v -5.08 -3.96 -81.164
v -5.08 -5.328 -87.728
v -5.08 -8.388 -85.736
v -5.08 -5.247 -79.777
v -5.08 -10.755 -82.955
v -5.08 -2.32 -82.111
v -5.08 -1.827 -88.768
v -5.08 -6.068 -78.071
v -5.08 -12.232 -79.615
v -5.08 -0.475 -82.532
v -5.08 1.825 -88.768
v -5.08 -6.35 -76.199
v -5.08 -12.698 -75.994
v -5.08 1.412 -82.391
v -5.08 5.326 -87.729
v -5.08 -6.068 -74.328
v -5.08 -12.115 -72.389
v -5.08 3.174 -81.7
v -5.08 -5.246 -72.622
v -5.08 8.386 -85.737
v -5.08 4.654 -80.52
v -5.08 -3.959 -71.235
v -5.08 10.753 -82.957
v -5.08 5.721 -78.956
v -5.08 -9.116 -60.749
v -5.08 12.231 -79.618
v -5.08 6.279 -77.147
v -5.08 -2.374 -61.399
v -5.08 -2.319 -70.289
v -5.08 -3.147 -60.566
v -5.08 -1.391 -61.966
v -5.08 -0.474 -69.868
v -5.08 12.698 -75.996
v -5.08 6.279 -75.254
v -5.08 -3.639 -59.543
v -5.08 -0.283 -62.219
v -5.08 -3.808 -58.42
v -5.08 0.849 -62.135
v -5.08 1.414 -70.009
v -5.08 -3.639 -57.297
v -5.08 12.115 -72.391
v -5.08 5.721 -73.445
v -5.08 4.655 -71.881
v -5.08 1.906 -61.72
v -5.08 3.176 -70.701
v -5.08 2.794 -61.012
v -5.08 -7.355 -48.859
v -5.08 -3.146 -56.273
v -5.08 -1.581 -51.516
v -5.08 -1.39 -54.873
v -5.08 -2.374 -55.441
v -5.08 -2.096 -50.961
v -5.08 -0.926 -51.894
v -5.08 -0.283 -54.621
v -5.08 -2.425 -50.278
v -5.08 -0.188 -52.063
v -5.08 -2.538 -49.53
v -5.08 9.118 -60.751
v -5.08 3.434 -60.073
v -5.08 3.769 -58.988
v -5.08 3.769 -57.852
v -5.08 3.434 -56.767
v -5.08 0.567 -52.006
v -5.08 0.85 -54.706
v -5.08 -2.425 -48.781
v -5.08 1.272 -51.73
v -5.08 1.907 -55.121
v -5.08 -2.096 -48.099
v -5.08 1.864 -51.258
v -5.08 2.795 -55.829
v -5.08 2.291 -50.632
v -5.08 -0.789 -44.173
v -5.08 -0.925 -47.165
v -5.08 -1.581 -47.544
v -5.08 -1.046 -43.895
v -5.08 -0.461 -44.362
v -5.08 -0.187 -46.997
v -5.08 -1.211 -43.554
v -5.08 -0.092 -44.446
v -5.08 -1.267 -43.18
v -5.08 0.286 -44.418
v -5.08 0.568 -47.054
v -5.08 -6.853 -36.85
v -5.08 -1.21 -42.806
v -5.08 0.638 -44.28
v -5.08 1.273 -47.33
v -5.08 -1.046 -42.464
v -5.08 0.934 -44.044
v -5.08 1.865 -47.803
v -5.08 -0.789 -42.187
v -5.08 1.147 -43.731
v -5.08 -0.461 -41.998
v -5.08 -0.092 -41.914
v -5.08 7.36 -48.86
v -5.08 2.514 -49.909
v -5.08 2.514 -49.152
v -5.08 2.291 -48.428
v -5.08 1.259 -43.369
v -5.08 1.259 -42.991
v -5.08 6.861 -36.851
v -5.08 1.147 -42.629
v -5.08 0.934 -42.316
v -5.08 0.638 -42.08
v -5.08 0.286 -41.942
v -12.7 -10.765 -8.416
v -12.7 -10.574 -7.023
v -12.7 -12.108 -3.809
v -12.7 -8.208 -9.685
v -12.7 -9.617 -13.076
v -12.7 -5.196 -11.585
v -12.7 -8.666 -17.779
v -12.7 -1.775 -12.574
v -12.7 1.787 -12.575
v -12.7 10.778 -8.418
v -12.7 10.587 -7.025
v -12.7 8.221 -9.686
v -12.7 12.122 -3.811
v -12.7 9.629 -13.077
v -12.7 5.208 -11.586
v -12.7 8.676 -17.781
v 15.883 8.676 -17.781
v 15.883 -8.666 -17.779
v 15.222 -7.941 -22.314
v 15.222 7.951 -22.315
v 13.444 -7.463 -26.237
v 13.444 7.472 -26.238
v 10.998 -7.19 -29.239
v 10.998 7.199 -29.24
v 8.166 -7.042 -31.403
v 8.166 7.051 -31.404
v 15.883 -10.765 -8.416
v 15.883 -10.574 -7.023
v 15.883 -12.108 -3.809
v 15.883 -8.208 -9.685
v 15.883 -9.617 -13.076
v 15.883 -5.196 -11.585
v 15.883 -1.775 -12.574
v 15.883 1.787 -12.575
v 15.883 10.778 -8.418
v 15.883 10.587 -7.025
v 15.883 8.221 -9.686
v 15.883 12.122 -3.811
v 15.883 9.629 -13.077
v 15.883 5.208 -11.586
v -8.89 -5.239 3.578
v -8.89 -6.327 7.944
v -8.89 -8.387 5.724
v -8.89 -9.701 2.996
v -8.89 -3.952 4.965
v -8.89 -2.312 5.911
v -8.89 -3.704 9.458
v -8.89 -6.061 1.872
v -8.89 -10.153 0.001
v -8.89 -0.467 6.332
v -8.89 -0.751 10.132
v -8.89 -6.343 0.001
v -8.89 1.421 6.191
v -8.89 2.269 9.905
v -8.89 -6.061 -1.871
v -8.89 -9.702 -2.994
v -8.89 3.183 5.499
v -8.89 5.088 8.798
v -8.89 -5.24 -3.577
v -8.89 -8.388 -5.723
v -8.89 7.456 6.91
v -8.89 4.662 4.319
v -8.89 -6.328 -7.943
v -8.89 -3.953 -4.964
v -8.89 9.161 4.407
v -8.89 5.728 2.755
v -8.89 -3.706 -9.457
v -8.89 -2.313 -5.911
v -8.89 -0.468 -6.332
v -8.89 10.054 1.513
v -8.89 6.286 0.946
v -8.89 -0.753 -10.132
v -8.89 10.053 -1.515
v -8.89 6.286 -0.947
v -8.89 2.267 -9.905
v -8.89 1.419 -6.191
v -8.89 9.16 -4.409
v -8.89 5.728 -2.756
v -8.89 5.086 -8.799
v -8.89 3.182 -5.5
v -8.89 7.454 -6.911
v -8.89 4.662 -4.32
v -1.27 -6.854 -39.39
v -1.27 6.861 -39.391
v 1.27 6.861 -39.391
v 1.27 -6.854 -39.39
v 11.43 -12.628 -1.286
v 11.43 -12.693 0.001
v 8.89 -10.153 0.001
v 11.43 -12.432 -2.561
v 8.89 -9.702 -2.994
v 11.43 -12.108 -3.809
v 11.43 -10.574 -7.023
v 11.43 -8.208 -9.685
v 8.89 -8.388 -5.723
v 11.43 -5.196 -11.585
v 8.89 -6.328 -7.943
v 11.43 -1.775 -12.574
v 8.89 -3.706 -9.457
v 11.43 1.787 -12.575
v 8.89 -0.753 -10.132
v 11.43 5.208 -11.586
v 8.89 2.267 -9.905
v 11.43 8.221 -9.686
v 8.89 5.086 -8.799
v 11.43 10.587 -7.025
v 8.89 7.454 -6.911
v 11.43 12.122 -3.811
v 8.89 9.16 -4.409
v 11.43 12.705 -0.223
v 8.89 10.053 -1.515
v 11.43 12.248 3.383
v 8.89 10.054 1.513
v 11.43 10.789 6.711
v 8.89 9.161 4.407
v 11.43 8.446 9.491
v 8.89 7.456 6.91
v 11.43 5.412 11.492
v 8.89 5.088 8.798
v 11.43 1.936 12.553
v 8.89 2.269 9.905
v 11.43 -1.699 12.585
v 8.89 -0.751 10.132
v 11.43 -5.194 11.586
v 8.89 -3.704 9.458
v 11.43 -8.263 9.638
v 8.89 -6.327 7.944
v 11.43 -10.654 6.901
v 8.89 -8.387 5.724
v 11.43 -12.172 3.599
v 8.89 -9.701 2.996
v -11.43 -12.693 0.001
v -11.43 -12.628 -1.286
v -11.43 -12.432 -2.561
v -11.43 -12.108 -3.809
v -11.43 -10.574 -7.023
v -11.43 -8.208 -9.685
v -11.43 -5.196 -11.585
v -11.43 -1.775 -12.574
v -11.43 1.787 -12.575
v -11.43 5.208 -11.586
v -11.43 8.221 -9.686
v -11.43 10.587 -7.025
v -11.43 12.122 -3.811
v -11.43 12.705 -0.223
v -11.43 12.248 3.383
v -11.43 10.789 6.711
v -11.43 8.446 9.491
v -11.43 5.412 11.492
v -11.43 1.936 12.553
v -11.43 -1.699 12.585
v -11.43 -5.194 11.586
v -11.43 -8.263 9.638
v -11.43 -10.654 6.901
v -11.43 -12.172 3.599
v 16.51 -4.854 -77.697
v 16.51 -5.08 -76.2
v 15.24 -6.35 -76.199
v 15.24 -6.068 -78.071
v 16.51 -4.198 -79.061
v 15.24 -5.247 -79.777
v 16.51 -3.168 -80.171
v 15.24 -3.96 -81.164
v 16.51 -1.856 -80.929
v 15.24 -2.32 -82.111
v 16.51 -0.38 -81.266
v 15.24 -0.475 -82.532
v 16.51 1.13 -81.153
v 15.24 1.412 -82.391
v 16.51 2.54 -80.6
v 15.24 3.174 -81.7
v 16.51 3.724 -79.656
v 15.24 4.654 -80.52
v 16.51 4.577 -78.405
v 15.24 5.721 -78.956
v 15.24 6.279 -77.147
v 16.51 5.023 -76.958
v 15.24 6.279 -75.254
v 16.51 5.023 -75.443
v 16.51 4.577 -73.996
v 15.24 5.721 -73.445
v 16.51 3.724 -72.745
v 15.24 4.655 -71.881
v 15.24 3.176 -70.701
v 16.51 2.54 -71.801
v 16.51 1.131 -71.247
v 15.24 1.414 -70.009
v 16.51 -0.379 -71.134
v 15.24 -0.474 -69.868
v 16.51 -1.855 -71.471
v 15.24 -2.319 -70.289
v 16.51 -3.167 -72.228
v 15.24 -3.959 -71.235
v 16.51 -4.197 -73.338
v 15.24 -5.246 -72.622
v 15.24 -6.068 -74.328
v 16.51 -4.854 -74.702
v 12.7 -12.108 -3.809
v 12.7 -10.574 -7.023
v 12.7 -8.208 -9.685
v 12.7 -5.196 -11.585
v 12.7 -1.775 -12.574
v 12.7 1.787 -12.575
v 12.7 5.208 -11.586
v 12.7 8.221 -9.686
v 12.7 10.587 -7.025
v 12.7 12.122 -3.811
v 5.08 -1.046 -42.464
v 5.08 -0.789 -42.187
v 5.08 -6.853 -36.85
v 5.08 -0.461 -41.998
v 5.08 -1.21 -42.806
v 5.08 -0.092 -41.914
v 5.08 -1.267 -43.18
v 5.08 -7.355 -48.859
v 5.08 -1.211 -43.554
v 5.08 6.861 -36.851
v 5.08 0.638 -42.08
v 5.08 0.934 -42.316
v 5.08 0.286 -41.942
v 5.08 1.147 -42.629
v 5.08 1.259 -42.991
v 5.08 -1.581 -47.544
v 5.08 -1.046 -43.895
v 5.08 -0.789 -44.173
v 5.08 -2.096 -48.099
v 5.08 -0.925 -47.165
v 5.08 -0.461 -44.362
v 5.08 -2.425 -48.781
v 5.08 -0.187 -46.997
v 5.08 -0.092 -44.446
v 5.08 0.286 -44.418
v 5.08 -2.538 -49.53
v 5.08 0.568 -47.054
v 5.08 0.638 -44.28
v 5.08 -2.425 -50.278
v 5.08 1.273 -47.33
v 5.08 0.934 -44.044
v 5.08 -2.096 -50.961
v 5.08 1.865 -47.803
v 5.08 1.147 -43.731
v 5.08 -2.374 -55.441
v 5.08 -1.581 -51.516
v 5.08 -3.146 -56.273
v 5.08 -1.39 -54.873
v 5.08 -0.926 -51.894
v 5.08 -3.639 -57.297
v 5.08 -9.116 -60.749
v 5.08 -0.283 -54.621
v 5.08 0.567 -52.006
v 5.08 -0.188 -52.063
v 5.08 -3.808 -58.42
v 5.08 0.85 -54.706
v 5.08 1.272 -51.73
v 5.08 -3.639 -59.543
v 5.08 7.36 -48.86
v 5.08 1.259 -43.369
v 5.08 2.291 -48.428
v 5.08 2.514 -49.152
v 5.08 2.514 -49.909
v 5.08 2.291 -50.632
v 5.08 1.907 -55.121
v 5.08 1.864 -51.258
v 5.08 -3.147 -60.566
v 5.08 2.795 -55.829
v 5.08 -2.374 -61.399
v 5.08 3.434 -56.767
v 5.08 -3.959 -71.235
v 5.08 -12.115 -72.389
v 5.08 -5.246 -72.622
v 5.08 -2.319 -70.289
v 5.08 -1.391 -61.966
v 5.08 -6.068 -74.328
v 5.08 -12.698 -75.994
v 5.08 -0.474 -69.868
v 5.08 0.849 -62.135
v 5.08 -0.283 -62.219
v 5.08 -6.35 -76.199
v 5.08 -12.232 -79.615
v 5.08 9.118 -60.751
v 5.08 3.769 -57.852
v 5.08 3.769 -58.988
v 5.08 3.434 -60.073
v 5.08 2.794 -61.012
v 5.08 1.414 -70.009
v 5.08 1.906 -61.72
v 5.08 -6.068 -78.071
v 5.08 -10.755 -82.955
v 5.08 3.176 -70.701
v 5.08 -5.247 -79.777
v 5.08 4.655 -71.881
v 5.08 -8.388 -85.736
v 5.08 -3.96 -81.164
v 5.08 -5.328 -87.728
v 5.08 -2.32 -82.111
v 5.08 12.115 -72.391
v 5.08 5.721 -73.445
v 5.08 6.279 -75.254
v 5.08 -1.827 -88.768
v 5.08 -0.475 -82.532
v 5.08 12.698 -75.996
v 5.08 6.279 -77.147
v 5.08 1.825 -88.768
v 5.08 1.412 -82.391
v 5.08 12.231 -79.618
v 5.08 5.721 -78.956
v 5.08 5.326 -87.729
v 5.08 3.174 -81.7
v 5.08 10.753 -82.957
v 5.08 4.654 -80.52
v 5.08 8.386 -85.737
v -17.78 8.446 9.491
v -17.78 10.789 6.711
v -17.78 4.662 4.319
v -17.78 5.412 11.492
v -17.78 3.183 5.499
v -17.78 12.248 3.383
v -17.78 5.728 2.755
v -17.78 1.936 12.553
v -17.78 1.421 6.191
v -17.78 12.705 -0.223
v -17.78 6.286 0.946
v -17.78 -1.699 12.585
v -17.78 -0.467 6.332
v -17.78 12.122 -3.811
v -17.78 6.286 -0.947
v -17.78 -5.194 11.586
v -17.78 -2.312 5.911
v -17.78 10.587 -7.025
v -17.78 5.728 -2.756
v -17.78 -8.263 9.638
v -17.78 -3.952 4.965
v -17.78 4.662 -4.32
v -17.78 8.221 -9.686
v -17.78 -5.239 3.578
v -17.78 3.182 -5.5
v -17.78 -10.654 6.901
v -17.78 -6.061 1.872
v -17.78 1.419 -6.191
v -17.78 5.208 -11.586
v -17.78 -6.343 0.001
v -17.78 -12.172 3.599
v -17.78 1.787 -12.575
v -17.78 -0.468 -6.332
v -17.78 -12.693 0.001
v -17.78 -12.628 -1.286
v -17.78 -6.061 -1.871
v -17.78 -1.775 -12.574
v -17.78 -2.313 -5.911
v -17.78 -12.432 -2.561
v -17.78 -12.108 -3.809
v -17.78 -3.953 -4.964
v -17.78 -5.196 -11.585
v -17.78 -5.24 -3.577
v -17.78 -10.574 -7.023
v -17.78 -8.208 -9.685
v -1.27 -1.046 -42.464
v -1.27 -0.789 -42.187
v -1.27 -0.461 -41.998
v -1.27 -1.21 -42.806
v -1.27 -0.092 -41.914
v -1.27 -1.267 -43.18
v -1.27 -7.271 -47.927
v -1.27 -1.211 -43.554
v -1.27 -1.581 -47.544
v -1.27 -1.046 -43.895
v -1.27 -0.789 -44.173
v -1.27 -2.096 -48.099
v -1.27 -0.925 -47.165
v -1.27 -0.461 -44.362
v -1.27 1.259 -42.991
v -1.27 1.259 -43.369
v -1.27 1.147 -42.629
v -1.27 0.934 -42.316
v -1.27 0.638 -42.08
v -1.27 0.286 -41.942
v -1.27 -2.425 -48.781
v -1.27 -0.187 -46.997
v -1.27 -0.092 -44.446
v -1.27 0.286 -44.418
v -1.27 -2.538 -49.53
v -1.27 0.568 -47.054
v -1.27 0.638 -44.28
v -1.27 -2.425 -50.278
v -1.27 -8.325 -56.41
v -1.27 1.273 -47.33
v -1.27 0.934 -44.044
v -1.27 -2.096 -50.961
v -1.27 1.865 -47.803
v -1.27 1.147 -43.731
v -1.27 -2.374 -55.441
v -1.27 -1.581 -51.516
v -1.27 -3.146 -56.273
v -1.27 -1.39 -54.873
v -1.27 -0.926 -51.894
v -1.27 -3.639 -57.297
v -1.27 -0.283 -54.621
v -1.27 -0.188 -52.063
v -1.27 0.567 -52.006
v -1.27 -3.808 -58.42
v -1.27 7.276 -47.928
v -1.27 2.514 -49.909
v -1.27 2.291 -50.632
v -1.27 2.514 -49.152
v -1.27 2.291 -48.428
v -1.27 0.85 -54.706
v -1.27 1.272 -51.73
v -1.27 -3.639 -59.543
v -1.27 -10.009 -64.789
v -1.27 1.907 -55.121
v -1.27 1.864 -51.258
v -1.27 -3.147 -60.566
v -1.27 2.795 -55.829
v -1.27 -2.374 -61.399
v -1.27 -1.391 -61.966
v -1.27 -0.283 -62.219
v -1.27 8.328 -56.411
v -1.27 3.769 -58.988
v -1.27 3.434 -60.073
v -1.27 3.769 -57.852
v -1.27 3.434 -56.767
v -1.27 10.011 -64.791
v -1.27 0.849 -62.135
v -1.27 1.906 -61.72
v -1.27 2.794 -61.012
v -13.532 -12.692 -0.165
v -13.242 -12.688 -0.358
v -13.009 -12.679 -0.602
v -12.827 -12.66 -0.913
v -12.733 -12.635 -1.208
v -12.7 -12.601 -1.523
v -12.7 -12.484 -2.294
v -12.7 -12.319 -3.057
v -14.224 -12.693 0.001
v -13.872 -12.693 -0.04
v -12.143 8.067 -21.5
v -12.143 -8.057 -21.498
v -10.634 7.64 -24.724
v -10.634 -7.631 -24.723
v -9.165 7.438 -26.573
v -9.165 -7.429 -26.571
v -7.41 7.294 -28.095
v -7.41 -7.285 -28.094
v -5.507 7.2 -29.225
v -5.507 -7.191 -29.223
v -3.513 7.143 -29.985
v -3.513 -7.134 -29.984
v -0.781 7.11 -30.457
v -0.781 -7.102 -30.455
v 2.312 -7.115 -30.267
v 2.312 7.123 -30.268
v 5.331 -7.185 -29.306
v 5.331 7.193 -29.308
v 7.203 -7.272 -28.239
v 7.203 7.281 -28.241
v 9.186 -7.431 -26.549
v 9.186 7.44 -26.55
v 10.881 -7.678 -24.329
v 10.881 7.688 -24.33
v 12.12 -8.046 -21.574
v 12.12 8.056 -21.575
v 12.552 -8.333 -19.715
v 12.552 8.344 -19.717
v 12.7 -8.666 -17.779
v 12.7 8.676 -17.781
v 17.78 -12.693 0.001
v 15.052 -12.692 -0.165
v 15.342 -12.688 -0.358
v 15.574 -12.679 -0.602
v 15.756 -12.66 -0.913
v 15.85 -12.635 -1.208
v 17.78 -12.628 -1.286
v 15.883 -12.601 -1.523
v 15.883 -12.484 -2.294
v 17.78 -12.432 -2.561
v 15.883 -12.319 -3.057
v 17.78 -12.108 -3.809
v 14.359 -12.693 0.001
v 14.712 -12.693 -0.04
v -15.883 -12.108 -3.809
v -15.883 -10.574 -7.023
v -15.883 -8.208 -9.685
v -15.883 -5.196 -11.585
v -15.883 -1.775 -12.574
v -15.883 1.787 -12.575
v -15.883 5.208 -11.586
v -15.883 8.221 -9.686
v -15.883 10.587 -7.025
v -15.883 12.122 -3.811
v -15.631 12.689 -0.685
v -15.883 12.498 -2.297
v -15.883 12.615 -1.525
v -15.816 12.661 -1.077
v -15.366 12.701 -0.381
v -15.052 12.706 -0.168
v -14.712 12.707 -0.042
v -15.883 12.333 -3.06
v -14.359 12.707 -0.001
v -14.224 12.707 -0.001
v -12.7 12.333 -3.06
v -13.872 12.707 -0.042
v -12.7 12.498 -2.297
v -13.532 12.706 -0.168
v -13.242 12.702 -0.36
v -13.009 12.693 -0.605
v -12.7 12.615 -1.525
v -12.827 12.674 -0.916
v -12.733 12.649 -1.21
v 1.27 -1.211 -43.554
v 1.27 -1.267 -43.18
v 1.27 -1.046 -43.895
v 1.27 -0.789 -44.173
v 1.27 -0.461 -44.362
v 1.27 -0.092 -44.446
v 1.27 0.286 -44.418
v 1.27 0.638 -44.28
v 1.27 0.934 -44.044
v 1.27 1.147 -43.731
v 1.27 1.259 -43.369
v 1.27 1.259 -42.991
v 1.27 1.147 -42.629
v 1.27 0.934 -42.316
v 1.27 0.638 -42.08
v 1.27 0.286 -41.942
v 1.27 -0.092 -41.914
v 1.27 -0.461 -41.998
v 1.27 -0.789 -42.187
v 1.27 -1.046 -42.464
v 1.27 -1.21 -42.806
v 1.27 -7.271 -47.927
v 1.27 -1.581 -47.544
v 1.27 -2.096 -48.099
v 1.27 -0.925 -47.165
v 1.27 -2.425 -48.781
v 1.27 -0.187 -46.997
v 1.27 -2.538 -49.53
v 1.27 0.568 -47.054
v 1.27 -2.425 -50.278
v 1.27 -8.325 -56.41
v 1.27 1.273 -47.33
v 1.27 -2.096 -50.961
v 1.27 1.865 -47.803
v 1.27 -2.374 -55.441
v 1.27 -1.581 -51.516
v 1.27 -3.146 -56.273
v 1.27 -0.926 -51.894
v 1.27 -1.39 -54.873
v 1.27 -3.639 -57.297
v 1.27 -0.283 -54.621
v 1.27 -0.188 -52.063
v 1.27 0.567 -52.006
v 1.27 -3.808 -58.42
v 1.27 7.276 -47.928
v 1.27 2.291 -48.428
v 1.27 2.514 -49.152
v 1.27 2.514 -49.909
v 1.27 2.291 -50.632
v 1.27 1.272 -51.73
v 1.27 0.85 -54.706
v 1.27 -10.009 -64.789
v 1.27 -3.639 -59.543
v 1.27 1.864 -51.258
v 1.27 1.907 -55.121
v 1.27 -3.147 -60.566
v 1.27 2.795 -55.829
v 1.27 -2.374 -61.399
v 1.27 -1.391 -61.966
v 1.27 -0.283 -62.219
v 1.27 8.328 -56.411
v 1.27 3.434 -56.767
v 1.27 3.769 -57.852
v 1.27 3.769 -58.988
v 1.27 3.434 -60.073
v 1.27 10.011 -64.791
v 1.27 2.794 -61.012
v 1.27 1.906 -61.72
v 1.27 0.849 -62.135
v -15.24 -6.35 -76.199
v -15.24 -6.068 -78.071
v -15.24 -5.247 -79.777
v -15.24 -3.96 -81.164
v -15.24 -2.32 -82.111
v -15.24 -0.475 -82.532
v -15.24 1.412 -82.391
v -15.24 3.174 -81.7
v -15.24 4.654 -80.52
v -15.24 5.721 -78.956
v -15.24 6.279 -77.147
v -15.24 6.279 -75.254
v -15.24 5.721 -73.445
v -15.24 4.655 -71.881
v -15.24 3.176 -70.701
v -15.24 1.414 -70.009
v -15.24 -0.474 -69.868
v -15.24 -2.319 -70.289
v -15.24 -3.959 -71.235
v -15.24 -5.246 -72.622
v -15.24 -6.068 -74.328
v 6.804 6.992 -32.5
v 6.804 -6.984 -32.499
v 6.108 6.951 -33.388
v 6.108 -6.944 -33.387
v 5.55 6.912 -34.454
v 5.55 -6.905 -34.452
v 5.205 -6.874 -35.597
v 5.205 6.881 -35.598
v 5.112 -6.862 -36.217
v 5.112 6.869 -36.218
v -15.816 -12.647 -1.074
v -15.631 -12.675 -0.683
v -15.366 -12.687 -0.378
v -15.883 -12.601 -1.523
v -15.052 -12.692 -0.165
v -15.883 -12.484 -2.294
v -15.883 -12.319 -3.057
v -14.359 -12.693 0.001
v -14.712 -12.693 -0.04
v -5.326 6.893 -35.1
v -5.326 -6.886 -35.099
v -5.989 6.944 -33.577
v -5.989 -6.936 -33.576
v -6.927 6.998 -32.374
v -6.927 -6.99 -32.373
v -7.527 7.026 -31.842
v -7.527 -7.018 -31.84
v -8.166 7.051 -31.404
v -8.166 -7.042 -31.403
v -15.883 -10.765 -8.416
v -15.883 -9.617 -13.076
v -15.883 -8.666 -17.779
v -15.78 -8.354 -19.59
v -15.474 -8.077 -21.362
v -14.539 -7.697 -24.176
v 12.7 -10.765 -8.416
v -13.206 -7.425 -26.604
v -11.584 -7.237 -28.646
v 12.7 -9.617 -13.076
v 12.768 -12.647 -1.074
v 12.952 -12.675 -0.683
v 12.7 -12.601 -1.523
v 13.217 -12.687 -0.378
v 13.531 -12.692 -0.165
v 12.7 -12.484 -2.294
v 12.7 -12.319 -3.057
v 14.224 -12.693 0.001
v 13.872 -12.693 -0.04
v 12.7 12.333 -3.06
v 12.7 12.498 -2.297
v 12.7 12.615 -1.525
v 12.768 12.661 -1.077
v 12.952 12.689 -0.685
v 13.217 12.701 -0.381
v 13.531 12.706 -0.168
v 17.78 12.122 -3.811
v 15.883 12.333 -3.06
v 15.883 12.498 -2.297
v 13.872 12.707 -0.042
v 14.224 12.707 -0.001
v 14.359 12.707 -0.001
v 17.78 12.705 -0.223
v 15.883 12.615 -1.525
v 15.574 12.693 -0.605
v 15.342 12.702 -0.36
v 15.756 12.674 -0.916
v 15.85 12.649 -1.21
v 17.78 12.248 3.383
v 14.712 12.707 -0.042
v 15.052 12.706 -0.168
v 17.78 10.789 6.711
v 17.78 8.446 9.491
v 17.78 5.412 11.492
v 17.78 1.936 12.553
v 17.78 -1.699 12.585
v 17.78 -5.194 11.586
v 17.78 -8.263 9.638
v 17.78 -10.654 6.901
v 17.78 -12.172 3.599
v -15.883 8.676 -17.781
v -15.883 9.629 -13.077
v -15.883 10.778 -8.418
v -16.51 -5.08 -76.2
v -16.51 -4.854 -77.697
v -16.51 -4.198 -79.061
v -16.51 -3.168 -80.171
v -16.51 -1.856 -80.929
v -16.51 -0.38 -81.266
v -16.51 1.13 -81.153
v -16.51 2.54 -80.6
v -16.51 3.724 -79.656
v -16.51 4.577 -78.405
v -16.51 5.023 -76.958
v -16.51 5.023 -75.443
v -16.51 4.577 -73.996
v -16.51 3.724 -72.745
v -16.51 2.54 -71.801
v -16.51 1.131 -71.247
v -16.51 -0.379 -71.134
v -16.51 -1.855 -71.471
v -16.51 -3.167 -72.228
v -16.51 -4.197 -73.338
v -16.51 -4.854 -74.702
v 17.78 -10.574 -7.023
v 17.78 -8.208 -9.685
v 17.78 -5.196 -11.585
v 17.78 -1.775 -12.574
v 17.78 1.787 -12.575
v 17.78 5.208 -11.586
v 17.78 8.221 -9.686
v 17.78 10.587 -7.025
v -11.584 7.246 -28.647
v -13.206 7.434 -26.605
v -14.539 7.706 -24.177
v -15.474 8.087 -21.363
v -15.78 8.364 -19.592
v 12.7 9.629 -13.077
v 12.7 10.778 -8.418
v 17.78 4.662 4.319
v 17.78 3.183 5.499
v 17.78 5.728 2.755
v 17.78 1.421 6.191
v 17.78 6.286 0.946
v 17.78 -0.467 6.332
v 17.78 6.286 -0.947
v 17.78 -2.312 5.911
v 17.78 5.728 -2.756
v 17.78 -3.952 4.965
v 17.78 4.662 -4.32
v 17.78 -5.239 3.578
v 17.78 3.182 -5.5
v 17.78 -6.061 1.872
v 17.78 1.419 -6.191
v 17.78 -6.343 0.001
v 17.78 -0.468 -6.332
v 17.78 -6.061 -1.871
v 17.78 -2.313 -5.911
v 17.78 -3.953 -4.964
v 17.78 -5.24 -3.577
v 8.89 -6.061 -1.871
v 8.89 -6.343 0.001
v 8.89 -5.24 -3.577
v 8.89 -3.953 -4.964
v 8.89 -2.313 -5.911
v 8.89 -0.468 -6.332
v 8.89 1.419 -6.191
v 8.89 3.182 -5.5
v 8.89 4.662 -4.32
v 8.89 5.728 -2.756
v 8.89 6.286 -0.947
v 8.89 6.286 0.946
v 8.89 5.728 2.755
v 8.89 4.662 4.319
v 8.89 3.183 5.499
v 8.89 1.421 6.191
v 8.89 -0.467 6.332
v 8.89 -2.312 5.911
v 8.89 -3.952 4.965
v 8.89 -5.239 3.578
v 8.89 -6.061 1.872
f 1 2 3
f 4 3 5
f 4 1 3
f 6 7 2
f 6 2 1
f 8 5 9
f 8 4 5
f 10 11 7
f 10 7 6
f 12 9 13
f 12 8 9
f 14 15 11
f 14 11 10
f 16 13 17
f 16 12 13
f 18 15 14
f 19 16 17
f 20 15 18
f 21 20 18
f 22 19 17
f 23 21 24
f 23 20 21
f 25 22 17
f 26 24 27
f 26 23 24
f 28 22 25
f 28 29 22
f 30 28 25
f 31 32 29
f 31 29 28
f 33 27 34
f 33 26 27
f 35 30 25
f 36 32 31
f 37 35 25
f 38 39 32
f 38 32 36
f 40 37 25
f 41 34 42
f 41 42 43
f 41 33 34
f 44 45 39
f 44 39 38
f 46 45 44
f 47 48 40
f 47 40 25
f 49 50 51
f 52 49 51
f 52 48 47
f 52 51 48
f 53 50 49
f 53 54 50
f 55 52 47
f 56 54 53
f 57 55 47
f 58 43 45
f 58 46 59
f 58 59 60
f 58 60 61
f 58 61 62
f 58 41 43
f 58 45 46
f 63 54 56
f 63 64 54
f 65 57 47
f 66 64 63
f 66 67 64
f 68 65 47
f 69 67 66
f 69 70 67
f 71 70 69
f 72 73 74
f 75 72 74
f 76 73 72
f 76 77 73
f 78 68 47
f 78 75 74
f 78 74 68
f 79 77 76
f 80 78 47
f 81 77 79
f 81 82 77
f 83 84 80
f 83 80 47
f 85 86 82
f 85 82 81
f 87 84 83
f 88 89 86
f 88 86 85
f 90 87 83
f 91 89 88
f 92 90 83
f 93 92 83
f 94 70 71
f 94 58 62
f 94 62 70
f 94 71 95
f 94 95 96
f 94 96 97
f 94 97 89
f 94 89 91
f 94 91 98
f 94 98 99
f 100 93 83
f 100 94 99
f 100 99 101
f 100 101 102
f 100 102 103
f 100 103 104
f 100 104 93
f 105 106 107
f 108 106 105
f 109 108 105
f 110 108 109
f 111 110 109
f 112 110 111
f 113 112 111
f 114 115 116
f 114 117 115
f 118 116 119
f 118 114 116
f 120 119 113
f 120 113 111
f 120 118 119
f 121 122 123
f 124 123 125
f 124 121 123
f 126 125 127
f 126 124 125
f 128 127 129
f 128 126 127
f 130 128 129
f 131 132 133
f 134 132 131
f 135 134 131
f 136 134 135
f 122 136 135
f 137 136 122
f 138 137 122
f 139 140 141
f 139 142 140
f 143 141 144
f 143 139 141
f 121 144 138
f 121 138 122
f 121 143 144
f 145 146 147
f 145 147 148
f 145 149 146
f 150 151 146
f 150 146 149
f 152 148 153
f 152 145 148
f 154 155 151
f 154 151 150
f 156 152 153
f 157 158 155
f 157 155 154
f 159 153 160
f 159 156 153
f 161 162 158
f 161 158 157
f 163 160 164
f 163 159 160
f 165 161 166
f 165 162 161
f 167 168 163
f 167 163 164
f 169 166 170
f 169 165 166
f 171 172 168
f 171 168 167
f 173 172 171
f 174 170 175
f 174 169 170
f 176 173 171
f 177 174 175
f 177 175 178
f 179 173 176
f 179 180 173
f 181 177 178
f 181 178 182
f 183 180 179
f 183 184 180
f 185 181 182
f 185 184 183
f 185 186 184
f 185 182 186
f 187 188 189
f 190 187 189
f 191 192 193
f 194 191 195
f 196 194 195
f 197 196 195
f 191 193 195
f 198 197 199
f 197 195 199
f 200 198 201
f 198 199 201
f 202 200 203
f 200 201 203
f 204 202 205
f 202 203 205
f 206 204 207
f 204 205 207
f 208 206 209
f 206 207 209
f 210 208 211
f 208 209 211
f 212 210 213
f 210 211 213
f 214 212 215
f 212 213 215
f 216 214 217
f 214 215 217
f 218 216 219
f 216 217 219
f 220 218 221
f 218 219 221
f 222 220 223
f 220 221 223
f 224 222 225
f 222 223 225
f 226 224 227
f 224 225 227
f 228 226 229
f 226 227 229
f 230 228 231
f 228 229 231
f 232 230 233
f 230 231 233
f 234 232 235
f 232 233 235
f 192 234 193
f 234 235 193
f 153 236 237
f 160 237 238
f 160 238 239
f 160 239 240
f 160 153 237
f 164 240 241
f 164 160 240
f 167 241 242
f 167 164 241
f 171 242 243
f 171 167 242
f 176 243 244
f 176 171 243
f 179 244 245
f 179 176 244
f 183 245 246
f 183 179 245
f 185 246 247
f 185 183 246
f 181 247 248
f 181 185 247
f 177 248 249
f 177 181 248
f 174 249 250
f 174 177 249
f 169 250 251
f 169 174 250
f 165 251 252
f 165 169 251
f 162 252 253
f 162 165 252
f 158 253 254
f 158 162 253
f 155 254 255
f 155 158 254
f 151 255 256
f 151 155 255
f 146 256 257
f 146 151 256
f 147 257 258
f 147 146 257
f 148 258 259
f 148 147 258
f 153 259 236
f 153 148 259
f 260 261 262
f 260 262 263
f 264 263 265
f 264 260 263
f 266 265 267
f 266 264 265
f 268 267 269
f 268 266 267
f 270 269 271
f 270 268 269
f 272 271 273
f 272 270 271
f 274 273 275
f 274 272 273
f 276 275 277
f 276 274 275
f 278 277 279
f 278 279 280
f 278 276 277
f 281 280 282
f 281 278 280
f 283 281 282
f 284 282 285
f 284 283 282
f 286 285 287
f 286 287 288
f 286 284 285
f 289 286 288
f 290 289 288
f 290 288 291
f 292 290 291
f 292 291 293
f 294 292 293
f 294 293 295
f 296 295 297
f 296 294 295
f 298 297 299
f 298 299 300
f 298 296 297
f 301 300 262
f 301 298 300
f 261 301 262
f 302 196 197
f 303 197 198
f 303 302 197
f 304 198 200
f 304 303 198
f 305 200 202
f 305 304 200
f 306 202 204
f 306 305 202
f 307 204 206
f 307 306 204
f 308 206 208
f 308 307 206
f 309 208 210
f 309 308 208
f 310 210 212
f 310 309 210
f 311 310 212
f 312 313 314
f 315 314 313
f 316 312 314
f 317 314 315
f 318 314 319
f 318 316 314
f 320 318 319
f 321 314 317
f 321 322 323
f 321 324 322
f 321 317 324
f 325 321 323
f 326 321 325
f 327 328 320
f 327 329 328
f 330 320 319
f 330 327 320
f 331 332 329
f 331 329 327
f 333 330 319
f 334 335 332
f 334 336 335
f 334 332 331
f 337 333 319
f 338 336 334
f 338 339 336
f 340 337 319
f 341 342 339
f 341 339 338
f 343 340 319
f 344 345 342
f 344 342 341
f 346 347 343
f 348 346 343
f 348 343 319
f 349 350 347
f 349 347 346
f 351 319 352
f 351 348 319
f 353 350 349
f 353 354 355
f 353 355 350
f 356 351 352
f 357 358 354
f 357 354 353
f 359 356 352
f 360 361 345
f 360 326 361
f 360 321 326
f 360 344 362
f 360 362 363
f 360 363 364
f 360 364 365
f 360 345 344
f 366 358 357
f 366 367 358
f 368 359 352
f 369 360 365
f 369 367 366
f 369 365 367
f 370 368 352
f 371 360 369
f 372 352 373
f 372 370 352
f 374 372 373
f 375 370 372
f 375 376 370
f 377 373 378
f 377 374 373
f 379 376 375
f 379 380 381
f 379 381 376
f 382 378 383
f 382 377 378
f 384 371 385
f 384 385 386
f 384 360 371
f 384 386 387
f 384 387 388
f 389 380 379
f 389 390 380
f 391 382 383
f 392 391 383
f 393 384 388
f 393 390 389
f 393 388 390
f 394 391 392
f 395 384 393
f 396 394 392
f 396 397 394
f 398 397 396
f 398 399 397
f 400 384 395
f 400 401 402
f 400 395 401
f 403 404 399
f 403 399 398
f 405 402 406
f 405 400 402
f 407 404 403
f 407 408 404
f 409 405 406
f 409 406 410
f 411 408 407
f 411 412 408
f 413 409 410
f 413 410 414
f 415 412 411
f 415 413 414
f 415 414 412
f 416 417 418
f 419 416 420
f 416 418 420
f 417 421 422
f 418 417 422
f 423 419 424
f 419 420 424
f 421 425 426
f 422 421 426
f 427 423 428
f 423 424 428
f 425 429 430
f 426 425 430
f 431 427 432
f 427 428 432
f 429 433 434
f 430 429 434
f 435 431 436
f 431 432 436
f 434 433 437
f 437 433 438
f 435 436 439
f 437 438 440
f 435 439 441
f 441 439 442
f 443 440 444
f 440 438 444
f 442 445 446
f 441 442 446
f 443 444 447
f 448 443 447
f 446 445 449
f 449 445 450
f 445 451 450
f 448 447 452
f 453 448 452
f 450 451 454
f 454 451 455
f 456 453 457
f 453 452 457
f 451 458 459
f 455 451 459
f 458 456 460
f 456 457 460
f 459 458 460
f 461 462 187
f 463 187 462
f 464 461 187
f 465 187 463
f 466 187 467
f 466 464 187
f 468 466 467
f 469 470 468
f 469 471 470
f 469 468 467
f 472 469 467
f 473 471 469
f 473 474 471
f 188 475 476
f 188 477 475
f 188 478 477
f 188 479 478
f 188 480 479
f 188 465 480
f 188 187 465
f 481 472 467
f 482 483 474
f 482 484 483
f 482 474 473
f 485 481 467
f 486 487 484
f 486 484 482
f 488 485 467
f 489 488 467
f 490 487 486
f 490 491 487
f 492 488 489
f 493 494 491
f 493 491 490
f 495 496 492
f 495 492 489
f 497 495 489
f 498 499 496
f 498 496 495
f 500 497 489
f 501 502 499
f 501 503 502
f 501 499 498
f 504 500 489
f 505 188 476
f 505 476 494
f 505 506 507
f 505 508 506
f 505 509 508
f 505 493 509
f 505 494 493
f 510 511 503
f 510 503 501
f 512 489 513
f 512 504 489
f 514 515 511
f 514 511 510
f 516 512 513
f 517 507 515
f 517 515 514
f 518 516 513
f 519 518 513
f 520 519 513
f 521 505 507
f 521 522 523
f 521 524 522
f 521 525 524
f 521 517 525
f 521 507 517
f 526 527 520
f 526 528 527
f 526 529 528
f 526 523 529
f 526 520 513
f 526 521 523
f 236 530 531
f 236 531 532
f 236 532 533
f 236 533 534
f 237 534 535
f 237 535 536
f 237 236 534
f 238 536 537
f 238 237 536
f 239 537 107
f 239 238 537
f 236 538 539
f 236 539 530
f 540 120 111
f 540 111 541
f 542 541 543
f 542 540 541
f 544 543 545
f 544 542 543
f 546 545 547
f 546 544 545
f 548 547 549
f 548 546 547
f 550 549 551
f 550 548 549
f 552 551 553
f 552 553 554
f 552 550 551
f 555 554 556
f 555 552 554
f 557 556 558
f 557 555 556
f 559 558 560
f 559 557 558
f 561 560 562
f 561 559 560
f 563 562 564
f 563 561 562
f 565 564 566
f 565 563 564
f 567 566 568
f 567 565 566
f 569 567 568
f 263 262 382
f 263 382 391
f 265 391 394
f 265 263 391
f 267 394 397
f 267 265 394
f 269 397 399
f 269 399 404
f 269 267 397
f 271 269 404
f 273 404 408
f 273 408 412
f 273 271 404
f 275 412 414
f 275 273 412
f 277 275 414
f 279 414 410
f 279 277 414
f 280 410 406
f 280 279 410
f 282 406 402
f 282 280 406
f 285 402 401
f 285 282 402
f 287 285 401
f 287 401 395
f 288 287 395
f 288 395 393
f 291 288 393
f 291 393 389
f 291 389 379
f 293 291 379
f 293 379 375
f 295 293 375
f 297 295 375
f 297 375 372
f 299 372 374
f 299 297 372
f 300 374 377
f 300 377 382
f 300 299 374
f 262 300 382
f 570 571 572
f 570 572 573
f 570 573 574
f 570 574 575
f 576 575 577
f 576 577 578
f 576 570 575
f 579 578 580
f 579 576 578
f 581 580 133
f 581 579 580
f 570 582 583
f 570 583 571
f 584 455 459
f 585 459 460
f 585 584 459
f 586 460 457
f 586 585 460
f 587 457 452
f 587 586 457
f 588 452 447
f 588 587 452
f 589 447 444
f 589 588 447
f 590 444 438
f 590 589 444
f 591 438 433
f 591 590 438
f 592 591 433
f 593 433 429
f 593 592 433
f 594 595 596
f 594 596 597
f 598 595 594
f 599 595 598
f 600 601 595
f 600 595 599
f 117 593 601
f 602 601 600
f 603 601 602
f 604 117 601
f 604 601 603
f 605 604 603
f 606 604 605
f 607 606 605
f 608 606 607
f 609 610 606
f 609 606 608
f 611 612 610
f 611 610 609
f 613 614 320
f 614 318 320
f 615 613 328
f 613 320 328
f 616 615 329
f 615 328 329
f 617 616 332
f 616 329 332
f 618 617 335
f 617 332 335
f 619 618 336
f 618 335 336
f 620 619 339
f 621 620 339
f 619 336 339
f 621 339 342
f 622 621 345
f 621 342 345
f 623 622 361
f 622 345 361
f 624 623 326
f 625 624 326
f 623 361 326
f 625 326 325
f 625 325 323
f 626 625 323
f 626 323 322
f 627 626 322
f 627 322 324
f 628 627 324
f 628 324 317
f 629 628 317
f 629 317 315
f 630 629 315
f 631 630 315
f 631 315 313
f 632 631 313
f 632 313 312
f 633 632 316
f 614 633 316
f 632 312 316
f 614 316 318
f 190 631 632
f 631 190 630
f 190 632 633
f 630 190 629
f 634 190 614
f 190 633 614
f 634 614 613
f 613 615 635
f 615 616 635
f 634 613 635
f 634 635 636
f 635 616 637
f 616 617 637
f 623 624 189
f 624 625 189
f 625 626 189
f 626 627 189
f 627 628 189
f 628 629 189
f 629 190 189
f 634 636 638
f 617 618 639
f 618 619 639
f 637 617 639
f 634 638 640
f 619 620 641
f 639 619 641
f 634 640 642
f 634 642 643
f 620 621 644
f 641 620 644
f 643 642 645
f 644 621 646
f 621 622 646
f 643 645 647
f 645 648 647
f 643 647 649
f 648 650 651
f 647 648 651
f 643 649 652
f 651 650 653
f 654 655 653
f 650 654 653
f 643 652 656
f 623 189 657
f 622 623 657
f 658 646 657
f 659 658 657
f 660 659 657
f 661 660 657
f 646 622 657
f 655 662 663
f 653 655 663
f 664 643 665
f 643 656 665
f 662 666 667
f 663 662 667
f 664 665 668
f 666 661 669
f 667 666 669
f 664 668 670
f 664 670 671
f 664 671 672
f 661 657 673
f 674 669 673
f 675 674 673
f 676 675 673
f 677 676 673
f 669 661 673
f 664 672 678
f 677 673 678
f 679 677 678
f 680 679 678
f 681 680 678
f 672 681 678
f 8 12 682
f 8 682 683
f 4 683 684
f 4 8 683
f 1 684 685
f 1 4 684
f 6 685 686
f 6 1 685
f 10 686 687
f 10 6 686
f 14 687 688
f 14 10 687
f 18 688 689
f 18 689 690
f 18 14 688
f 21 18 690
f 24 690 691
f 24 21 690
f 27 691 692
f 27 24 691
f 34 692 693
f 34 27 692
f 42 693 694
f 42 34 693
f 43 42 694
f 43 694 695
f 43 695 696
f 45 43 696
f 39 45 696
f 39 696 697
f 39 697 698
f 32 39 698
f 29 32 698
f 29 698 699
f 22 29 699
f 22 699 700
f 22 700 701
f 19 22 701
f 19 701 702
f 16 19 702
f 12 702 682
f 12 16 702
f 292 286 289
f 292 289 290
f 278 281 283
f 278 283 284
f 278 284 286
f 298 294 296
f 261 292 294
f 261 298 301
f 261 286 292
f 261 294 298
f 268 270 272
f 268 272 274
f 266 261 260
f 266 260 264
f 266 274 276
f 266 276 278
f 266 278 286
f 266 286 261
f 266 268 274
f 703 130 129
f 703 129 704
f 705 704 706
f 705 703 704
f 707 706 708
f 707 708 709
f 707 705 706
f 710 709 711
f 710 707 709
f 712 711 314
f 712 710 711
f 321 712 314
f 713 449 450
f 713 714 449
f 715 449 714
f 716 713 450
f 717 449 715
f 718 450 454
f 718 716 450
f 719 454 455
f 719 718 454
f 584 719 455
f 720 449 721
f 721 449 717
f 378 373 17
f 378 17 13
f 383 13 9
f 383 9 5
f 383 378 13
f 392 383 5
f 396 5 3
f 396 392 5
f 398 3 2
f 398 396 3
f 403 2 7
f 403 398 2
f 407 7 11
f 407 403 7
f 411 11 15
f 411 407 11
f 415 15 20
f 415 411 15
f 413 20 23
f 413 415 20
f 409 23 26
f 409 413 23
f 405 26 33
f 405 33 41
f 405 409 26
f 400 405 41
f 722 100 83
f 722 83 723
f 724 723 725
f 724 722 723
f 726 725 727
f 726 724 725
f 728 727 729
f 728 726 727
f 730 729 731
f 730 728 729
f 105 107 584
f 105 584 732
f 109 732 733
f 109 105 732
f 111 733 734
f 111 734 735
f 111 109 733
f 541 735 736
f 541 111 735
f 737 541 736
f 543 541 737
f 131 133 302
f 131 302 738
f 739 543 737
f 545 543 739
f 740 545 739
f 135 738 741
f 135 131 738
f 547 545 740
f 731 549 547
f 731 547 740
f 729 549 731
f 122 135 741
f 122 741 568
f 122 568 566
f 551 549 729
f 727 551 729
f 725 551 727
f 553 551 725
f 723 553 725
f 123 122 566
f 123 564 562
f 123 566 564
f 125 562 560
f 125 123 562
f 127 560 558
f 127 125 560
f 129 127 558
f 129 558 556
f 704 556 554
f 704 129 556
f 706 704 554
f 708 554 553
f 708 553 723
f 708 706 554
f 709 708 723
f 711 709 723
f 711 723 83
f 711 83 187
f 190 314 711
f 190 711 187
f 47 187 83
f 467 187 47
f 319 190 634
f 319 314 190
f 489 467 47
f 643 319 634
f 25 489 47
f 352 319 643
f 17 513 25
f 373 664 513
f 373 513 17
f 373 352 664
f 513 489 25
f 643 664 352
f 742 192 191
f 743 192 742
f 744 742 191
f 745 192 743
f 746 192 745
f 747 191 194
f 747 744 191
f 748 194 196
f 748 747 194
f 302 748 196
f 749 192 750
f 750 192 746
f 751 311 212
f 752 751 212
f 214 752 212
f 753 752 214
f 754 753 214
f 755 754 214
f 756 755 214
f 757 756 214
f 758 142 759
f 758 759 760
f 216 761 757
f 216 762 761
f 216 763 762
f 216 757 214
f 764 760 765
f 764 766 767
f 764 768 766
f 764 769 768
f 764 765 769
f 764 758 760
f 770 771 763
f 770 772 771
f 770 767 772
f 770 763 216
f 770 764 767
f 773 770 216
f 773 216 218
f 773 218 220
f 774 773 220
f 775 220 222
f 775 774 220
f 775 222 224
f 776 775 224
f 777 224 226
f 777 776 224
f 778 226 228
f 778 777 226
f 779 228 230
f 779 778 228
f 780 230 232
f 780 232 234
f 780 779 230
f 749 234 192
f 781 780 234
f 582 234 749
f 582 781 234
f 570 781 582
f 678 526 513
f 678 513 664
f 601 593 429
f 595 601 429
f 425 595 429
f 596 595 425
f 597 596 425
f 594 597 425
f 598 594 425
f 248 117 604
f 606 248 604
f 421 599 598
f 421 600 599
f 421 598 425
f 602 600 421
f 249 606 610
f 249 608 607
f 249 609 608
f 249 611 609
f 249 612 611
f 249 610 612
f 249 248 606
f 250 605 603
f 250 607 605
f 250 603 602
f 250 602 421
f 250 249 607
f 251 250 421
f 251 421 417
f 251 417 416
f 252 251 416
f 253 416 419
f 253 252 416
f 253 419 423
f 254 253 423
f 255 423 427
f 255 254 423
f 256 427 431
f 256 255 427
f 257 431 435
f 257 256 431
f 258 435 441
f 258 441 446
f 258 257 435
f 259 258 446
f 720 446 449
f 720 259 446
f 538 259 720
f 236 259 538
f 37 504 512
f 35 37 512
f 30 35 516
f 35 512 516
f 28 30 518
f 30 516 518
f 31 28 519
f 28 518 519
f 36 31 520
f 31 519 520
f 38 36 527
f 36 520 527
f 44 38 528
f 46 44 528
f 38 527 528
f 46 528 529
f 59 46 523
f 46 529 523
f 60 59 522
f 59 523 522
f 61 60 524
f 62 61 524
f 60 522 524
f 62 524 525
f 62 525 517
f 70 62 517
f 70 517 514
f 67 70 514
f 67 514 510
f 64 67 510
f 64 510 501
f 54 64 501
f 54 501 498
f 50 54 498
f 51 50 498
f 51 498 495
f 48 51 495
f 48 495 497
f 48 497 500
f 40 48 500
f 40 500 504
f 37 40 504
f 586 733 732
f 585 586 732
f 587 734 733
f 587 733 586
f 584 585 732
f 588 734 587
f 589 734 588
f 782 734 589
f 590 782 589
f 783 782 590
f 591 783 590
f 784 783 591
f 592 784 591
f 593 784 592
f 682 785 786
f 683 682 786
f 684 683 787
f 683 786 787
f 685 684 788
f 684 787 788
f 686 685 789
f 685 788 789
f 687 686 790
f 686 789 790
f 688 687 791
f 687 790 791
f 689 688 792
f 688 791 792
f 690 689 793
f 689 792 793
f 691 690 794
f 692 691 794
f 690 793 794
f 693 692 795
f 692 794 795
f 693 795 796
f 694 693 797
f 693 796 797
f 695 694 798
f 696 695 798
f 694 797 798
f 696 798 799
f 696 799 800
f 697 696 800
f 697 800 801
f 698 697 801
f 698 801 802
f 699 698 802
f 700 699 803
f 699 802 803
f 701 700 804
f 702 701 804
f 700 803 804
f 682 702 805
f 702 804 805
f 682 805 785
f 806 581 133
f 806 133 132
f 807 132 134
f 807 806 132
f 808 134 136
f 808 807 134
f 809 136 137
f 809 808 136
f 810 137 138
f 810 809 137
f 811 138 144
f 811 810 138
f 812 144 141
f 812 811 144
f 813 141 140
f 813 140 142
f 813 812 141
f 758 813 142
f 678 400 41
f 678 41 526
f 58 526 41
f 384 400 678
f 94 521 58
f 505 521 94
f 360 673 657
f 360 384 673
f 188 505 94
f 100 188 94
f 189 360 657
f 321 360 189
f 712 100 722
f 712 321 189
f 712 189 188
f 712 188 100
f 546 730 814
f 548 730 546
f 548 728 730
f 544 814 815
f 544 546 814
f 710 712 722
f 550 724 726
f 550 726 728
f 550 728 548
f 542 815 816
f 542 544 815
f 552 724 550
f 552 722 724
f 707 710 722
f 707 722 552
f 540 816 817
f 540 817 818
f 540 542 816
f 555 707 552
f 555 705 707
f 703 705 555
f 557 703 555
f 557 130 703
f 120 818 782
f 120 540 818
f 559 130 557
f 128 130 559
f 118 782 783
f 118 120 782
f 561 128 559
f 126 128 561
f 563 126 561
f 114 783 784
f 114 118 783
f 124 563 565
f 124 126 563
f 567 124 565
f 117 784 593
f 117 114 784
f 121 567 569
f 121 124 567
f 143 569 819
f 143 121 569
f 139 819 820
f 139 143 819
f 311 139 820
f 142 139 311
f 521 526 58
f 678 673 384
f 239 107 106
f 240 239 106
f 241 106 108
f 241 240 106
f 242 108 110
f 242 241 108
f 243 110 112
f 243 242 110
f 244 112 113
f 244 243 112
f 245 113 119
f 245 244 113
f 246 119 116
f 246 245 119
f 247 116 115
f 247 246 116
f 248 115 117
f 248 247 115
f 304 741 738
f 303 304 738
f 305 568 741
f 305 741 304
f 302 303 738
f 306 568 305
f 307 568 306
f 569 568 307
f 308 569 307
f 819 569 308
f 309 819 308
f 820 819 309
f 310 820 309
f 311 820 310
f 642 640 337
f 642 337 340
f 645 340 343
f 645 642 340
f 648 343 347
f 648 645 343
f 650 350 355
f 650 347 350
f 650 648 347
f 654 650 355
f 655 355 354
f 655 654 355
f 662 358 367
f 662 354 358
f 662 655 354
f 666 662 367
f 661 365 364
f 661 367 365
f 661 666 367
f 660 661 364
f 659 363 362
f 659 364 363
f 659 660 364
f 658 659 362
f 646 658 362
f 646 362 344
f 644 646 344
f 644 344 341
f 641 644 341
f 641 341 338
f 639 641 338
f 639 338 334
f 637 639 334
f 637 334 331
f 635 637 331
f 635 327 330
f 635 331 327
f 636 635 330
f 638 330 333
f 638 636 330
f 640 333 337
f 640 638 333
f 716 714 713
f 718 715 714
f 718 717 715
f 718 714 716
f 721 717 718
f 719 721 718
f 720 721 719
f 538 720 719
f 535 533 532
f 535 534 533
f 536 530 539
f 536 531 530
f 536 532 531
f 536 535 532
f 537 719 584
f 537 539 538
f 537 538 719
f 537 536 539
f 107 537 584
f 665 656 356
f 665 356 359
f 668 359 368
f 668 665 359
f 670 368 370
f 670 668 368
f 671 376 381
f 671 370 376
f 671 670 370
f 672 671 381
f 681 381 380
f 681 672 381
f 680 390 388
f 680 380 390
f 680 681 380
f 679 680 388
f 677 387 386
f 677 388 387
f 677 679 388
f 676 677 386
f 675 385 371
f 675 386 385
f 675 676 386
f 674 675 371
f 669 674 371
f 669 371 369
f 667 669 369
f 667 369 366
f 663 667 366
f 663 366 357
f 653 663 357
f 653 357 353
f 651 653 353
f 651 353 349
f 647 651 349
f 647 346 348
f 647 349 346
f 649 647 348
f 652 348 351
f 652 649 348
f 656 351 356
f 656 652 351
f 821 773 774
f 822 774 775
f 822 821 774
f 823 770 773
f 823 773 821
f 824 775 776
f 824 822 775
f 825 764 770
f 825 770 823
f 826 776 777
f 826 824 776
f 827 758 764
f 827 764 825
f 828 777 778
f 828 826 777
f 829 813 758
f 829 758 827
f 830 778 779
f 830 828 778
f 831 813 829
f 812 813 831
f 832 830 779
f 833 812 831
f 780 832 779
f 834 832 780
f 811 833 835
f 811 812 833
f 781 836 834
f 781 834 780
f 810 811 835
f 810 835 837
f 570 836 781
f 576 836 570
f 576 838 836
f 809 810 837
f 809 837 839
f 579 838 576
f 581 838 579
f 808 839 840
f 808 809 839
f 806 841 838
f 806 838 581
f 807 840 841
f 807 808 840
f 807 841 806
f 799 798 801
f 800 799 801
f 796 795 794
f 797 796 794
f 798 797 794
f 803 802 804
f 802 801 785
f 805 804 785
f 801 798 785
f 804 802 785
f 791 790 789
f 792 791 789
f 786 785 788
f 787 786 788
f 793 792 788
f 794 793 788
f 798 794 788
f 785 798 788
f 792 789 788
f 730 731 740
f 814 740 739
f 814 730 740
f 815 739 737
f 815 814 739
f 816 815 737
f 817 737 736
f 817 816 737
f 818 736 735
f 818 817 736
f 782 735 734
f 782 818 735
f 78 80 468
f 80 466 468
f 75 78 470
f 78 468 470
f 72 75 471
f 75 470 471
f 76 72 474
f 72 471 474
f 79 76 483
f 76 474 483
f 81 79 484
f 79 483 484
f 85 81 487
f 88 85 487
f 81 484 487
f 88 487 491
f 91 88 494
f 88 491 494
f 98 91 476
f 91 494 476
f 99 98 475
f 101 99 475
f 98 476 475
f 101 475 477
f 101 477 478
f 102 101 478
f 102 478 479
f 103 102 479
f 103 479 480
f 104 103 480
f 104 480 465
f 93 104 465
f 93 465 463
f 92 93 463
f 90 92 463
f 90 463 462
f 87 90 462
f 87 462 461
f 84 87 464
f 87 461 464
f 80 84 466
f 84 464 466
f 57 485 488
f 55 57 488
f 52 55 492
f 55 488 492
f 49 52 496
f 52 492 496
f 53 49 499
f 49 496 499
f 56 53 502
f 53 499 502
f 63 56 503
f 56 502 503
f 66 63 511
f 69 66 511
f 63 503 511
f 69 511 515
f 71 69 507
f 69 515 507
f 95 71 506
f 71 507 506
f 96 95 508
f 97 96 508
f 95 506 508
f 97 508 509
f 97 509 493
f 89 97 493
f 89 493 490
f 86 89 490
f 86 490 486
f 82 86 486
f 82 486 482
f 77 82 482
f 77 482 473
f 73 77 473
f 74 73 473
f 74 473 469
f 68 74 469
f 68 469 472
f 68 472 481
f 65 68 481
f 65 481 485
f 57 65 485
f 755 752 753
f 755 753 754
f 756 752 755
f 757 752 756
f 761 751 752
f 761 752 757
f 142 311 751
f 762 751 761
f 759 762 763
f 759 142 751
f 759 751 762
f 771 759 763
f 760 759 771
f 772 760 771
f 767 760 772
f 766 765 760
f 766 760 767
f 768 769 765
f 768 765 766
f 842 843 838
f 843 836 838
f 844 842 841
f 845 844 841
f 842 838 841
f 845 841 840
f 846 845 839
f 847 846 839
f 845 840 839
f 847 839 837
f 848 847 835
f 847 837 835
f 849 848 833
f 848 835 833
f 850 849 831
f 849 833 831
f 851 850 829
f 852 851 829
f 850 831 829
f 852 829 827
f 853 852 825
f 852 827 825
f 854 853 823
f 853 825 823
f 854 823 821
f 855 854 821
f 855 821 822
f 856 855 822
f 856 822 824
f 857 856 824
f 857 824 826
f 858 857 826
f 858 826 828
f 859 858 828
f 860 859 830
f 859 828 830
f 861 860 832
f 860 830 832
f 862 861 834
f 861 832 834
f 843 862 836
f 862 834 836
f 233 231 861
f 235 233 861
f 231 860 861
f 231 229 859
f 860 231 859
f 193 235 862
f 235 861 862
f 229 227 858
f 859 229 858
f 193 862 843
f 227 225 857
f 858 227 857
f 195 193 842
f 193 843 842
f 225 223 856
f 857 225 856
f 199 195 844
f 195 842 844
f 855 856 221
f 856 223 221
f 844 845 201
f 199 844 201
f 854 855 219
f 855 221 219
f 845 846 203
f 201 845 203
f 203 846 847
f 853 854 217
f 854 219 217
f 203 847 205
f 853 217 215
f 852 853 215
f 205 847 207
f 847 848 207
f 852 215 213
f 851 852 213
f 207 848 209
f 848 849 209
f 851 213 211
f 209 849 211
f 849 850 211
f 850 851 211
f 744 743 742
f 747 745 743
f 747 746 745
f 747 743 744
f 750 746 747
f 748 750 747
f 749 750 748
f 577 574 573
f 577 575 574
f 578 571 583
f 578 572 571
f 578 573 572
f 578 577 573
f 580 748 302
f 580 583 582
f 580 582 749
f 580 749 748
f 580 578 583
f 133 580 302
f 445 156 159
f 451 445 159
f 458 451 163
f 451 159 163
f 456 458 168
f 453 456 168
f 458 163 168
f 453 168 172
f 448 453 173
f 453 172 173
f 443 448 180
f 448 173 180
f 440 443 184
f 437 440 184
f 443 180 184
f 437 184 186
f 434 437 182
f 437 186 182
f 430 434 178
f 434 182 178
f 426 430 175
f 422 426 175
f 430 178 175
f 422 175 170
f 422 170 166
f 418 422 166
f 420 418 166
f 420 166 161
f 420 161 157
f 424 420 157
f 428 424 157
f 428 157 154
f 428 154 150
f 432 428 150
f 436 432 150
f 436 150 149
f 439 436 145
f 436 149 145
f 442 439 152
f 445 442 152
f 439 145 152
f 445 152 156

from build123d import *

# Parameters (mm, degrees)
F1_DEPTH  = 19.05
F3_R      = 12.7
F4_DEPTH  = 17.78
F2_R      = 6.35
F6_DEPTH  = 38.1
F5_W      = 17.78
F5_H      = 38.1
F7_DEPTH  = 19.05
F8_SIZE   = 2.54
F10_DEPTH = 5.08
F11_R     = 6.35
F12_DEPTH = 16.51
F13_SIZE  = 1.27
F15_DEPTH = 38.1
F16_W     = 2.54
F16_H     = 25.4
F17_DEPTH = 25.4
F18_R     = 3.81
F18_R_2   = 2.54
F18_R_3   = 1.27
F19_DEPTH = 12.7
F20_ANGLE = 179.9946913403


with BuildPart() as f1:
    # F0 (on Front) → F1 (new body, symmetric)
    with BuildSketch(Plane.XZ):
        with BuildLine():
            ThreePointArc((-5.08, -13.9496366999), (-5.9049678847, -17.0795760164), (-8.1655181496, -19.3962556739))
            ThreePointArc((-8.1655181496, -19.3962556739), (-13.8198807904, -25.1910159629), (-15.8833905736, -33.02))
            Line((-15.8833905736, -33.02), (-15.8833905736, -49.276))
            ThreePointArc((-15.8833905736, -49.276), (-15.4370213081, -50.3536307345), (-14.3593905736, -50.8))
            Line((-14.3593905736, -50.8), (-14.224, -50.8))
            ThreePointArc((-14.224, -50.8), (-13.1463692655, -50.3536307345), (-12.7, -49.276))
            Line((-12.7, -49.276), (-12.7, -33.02))
            ThreePointArc((-12.7, -33.02), (0, -20.32), (12.7, -33.02))
            Line((12.7, -33.02), (12.7, -49.276))
            ThreePointArc((12.7, -49.276), (13.1463692655, -50.3536307345), (14.224, -50.8))
            Line((14.224, -50.8), (14.3593905736, -50.8))
            ThreePointArc((14.3593905736, -50.8), (15.4370213081, -50.3536307345), (15.8833905736, -49.276))
            Line((15.8833905736, -49.276), (15.8833905736, -33.02))
            ThreePointArc((15.8833905736, -33.02), (13.8198807904, -25.1910159629), (8.1655181496, -19.3962556739))
            ThreePointArc((8.1655181496, -19.3962556739), (5.9049678847, -17.0795760164), (5.08, -13.9496366999))
            Line((5.08, -13.9496366999), (5.08, 2.3491094791))
            Line((5.08, 2.3491094791), (-5.08, 2.3491094791))
            Line((-5.08, 2.3491094791), (-5.08, -13.9496366999))
        make_face()
    extrude(amount=F1_DEPTH, both=True)

    # F3 (on Right) → F4 (join, symmetric)
    with BuildSketch(Plane.YZ):
        with Locations((0, -50.8)):
            Circle(F3_R)
    extrude(amount=F4_DEPTH, both=True)

    # F2 (on Right) → F6 (cut, symmetric)
    with BuildSketch(Plane.YZ):
        with Locations((0, -50.8)):
            Circle(F2_R)
    extrude(amount=F6_DEPTH, both=True, mode=Mode.SUBTRACT)

    # F5 (on Front) → F7 (cut, symmetric)
    with BuildSketch(Plane.XZ):
        with Locations((0, -50.8)):
            Rectangle(F5_W, F5_H)
    extrude(amount=F7_DEPTH, both=True, mode=Mode.SUBTRACT)

    # F8
    f8_edges = [f1.edges().sort_by_distance(p)[0] for p in [
        (-8.89, -12.7, -50.8),
        (8.89, -12.7, -50.8),
    ]]
    chamfer(f8_edges, length=F8_SIZE)

    # F9 (on Right) → F10 (join, symmetric)
    with BuildSketch(Plane.YZ):
        with BuildLine():
            Line((19.0499954742, -0.0131314098), (19.0499954742, 25.3868685902))
            ThreePointArc((19.0499954742, 25.3868685902), (0, 44.45), (-19.0499954742, 25.3868685902))
            Line((-19.0499954742, 25.3868685902), (-19.0499954742, -0.0131314098))
            Line((-19.0499954742, -0.0131314098), (19.0499954742, -0.0131314098))
        make_face()
    extrude(amount=F10_DEPTH, both=True)

    # F11 (on Right) → F12 (join, symmetric)
    with BuildSketch(Plane.YZ):
        with Locations((0, 25.4)):
            Circle(F11_R)
    extrude(amount=F12_DEPTH, both=True)

    # F13
    f13_edges = [f1.edges().sort_by_distance(p)[0] for p in [
        (-16.51, -6.35, 25.4),
        (16.51, -6.35, 25.4),
    ]]
    chamfer(f13_edges, length=F13_SIZE)

    # F14 (on Right) → F15 (intersect, symmetric)
    with BuildSketch(Plane.YZ):
        with BuildLine():
            ThreePointArc((12.115027858, -46.99), (6.85027858, -12.7), (12.115027858, 21.59))
            ThreePointArc((12.115027858, 21.59), (0, 38.1), (-12.115027858, 21.59))
            ThreePointArc((-12.115027858, 21.59), (-6.85027858, -12.7), (-12.115027858, -46.99))
            ThreePointArc((-12.115027858, -46.99), (0, -63.5), (12.115027858, -46.99))
        make_face()
    extrude(amount=F15_DEPTH, both=True, mode=Mode.INTERSECT)

    # F16 (on Front) → F17 (cut, symmetric)
    with BuildSketch(Plane.XZ):
        with Locations((0, 1.2903633001)):
            Rectangle(F16_W, F16_H)
    extrude(amount=F17_DEPTH, both=True, mode=Mode.SUBTRACT)

    # F18 (on Right) → F19 (cut, symmetric)
    with BuildSketch(Plane.YZ):
        with Locations((0, 7.62)):
            Circle(F18_R)
        with Locations((0, -1.27)):
            Circle(F18_R_2)
        with Locations((0, -7.62)):
            Circle(F18_R_3)
    extrude(amount=F19_DEPTH, both=True, mode=Mode.SUBTRACT)


with BuildPart() as f1_1:
    # F20: moved
    add(f1.part.rotate(Axis((15.24, 0, 25.4), (1, 0, 0)), F20_ANGLE))


with BuildPart() as f1_2:
    # F22: moved
    add(f1_1.part.moved(Location((0, 0, -101.5999996729))))


solid = f1_2.part
